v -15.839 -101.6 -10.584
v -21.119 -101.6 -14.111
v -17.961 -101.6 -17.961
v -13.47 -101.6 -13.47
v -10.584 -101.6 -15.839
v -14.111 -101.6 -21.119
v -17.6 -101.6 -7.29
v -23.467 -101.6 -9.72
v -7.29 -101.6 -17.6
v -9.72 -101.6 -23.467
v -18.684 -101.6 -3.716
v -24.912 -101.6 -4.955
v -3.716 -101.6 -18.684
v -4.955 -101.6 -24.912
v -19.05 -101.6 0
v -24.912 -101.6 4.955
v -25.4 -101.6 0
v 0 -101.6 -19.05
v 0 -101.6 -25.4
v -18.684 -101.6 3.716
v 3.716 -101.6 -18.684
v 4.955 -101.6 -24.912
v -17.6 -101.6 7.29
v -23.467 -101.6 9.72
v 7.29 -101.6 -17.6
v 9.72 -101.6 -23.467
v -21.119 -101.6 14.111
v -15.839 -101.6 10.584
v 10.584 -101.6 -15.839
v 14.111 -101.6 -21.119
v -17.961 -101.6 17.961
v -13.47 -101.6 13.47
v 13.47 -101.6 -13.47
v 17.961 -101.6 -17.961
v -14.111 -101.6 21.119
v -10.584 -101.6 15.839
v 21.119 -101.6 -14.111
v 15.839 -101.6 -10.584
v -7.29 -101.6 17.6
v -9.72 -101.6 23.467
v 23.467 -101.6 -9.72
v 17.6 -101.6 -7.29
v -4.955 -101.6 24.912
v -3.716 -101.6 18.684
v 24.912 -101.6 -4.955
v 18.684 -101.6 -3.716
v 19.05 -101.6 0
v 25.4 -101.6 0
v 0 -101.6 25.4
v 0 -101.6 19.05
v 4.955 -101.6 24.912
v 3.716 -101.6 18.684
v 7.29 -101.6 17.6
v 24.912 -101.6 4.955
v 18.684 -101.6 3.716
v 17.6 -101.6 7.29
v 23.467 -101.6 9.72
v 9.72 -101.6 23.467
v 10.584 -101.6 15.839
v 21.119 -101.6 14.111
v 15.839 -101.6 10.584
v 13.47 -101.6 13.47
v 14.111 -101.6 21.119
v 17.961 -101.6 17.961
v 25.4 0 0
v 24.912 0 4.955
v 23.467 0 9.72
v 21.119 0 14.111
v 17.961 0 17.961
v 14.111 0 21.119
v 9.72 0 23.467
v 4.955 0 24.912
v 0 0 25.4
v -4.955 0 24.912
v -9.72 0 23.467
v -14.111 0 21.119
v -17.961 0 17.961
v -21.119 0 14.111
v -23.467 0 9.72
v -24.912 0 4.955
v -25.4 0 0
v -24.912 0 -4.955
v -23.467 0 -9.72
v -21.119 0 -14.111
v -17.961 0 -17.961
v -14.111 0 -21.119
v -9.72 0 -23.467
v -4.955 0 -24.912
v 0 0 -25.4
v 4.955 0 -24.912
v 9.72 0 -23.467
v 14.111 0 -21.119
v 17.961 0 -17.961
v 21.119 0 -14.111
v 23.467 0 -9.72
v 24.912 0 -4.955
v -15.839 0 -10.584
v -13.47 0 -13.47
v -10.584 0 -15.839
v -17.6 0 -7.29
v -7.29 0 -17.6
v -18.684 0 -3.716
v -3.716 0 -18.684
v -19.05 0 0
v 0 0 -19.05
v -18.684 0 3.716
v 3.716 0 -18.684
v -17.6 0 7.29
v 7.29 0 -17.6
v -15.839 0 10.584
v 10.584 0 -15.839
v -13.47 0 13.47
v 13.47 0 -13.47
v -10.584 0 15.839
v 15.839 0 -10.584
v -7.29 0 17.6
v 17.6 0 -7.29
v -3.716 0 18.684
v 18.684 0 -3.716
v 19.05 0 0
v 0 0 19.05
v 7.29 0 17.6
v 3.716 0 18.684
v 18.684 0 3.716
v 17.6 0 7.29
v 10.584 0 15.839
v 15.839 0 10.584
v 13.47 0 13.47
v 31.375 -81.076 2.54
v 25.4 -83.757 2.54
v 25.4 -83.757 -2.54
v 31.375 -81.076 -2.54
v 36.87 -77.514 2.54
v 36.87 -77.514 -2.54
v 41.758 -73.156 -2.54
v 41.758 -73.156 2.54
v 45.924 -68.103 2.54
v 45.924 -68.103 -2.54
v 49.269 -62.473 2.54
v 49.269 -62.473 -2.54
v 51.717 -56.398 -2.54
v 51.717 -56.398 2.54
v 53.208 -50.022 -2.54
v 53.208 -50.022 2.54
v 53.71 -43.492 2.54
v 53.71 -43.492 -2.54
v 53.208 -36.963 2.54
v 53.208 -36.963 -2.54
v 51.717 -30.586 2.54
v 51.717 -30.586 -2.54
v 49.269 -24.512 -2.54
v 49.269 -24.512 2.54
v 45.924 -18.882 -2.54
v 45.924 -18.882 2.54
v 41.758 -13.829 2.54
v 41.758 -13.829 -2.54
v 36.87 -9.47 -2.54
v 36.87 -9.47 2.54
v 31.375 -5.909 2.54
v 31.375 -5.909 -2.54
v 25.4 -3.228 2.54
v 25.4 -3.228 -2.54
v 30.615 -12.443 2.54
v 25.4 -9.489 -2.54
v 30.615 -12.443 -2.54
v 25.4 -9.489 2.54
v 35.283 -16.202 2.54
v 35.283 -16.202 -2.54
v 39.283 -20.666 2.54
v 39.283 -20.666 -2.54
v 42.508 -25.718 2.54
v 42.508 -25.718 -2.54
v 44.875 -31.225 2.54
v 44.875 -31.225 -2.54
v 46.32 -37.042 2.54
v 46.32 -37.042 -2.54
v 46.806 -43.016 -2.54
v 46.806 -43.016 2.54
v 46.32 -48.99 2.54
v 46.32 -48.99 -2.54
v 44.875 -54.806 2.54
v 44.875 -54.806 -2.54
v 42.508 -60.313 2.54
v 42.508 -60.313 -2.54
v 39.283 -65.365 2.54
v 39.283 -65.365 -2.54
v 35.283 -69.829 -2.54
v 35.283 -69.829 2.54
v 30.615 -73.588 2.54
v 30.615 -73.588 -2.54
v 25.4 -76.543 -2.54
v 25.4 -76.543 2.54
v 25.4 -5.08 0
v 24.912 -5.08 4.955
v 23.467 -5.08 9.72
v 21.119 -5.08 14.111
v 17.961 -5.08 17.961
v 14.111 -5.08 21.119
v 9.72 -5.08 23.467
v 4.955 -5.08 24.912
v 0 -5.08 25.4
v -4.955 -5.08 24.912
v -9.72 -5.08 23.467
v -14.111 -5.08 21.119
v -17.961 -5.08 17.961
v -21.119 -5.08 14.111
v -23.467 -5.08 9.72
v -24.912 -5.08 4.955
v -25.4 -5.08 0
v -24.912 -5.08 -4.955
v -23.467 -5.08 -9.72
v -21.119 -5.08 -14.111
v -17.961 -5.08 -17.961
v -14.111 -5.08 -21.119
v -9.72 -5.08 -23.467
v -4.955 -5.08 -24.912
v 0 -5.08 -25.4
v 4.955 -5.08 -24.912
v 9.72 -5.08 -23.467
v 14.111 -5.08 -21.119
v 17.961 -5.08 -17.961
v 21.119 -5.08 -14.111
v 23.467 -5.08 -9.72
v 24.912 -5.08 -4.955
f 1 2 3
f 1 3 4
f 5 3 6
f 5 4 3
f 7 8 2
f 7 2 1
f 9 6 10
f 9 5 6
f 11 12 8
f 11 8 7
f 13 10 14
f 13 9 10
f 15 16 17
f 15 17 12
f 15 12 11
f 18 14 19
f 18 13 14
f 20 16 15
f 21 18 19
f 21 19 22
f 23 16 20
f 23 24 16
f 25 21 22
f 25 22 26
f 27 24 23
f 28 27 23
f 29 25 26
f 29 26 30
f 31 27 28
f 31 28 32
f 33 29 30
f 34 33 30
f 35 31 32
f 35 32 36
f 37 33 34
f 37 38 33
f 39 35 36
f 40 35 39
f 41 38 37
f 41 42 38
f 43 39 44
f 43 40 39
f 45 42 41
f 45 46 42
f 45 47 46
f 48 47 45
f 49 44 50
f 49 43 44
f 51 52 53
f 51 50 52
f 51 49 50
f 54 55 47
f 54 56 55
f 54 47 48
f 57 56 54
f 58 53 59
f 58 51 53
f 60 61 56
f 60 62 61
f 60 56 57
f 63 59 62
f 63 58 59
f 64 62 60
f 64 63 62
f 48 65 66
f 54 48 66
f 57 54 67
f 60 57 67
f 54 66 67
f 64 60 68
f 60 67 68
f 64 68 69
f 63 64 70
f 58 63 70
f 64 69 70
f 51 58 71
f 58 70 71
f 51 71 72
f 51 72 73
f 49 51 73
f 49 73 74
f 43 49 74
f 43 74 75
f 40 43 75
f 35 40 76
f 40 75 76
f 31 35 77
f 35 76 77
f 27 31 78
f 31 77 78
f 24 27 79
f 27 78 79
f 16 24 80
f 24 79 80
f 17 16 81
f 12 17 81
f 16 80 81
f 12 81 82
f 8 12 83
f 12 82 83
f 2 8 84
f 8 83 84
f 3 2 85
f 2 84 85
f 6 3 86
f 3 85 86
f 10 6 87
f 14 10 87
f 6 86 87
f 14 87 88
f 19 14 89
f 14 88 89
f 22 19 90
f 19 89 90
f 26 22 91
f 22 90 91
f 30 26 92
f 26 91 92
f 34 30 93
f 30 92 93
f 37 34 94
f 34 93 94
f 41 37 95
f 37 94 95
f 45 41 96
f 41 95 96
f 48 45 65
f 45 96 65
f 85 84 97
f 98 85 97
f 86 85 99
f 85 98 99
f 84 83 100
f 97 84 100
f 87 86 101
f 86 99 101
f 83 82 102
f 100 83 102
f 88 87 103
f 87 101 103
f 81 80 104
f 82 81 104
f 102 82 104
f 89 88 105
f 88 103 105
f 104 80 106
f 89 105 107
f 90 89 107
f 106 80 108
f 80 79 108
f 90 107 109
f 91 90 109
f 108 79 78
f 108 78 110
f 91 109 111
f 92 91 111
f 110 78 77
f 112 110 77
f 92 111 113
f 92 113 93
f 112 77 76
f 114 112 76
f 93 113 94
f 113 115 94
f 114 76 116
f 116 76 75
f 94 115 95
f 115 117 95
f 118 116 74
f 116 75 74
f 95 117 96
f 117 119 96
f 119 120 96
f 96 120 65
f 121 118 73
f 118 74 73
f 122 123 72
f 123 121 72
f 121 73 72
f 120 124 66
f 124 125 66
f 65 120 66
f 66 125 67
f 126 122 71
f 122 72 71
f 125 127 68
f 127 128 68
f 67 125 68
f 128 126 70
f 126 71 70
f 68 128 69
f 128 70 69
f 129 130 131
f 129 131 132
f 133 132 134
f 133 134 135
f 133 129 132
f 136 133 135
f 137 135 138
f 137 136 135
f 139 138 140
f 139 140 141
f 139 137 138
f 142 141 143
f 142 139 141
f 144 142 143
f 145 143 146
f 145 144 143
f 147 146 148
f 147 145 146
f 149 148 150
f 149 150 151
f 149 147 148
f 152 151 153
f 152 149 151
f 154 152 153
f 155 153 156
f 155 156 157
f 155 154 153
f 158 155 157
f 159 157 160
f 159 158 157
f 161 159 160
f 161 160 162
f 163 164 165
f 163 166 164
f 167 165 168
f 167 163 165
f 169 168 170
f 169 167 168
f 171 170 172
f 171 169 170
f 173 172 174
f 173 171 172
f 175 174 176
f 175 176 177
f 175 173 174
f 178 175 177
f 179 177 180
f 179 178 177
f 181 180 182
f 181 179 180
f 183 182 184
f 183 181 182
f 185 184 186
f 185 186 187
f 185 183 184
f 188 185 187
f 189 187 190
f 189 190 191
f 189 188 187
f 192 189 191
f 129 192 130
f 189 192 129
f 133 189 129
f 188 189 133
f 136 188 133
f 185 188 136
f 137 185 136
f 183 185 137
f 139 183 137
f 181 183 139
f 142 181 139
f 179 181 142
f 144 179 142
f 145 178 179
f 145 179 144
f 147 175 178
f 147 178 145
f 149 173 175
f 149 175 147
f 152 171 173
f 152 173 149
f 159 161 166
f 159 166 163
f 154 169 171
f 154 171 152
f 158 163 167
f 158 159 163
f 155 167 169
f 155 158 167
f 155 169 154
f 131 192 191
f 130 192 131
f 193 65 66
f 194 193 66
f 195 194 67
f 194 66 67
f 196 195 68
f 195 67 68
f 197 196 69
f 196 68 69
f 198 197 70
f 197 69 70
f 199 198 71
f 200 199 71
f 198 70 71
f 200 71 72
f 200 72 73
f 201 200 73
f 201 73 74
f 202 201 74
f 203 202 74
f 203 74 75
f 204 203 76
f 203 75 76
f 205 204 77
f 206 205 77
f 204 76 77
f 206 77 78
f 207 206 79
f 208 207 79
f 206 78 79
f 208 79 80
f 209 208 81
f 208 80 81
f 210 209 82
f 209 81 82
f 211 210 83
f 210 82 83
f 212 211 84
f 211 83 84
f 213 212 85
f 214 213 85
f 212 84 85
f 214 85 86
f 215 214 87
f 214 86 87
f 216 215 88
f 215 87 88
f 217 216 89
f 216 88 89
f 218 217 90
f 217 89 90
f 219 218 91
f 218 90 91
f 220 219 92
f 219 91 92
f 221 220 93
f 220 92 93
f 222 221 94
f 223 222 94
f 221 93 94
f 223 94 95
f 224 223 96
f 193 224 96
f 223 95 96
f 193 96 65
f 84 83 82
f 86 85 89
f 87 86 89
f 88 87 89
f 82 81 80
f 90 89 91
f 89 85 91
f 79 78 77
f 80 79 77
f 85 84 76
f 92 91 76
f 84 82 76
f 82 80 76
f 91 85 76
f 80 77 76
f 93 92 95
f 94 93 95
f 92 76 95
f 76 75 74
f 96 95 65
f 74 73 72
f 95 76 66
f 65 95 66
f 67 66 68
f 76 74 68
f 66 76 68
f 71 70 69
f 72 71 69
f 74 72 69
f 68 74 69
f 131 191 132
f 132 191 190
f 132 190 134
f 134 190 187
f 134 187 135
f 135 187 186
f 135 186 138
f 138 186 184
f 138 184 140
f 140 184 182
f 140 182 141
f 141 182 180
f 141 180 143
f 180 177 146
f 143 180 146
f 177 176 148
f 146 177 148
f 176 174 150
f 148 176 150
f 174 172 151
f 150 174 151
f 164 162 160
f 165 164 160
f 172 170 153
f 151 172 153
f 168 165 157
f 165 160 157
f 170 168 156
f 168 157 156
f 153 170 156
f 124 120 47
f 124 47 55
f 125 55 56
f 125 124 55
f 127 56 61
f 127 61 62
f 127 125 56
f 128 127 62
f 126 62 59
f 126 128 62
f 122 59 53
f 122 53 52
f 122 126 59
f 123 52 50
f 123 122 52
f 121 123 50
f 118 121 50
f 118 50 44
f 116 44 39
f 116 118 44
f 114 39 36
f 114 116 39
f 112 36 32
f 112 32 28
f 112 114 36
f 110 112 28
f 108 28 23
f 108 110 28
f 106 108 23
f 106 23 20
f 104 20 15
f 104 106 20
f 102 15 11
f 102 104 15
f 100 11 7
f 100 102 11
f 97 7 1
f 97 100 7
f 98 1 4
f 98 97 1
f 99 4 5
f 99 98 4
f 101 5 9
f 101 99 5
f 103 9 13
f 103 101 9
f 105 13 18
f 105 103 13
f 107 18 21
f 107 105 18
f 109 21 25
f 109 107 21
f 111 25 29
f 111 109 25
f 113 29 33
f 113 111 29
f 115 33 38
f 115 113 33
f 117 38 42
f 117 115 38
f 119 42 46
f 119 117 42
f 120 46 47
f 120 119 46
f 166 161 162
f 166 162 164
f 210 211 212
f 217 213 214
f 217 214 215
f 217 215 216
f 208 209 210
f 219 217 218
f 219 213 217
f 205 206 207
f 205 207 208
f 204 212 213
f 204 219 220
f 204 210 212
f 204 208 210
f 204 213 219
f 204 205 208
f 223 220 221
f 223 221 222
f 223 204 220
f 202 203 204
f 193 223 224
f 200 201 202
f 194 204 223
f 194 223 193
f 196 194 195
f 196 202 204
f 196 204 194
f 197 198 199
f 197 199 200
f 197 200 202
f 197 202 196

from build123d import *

# Parameters (mm, degrees)
F0_R     = 25.4
F0_R_2   = 19.05
F1_DEPTH = 101.6
F3_DEPTH = 2.54
F4_R     = 25.4
F5_DEPTH = 5.08


with BuildPart() as f1:
    # F0 (on Front) → F1 (new body)
    with BuildSketch(Plane.XZ):
        Circle(F0_R)
        Circle(F0_R_2, mode=Mode.SUBTRACT)
    extrude(amount=F1_DEPTH)


with BuildPart() as f3:
    # F2 (on Top) → F3 (new body, symmetric)
    with BuildSketch(Plane.XY):
        with BuildLine():
            Line((25.4, -76.5425107099), (25.4, -83.7568040209))
            ThreePointArc((25.4, -83.7568040209), (53.7095561275, -43.4922314016), (25.4, -3.2276587823))
            Line((25.4, -3.2276587823), (25.4, -9.4887303788))
            ThreePointArc((25.4, -9.4887303788), (46.8062490865, -43.0156205443), (25.4, -76.5425107099))
        make_face()
    extrude(amount=F3_DEPTH, both=True)


with BuildPart() as f5:
    # F4 (on Front) → F5 (new body)
    with BuildSketch(Plane.XZ):
        Circle(F4_R)
    extrude(amount=F5_DEPTH)


solid = Compound([f1.part, f3.part, f5.part])
